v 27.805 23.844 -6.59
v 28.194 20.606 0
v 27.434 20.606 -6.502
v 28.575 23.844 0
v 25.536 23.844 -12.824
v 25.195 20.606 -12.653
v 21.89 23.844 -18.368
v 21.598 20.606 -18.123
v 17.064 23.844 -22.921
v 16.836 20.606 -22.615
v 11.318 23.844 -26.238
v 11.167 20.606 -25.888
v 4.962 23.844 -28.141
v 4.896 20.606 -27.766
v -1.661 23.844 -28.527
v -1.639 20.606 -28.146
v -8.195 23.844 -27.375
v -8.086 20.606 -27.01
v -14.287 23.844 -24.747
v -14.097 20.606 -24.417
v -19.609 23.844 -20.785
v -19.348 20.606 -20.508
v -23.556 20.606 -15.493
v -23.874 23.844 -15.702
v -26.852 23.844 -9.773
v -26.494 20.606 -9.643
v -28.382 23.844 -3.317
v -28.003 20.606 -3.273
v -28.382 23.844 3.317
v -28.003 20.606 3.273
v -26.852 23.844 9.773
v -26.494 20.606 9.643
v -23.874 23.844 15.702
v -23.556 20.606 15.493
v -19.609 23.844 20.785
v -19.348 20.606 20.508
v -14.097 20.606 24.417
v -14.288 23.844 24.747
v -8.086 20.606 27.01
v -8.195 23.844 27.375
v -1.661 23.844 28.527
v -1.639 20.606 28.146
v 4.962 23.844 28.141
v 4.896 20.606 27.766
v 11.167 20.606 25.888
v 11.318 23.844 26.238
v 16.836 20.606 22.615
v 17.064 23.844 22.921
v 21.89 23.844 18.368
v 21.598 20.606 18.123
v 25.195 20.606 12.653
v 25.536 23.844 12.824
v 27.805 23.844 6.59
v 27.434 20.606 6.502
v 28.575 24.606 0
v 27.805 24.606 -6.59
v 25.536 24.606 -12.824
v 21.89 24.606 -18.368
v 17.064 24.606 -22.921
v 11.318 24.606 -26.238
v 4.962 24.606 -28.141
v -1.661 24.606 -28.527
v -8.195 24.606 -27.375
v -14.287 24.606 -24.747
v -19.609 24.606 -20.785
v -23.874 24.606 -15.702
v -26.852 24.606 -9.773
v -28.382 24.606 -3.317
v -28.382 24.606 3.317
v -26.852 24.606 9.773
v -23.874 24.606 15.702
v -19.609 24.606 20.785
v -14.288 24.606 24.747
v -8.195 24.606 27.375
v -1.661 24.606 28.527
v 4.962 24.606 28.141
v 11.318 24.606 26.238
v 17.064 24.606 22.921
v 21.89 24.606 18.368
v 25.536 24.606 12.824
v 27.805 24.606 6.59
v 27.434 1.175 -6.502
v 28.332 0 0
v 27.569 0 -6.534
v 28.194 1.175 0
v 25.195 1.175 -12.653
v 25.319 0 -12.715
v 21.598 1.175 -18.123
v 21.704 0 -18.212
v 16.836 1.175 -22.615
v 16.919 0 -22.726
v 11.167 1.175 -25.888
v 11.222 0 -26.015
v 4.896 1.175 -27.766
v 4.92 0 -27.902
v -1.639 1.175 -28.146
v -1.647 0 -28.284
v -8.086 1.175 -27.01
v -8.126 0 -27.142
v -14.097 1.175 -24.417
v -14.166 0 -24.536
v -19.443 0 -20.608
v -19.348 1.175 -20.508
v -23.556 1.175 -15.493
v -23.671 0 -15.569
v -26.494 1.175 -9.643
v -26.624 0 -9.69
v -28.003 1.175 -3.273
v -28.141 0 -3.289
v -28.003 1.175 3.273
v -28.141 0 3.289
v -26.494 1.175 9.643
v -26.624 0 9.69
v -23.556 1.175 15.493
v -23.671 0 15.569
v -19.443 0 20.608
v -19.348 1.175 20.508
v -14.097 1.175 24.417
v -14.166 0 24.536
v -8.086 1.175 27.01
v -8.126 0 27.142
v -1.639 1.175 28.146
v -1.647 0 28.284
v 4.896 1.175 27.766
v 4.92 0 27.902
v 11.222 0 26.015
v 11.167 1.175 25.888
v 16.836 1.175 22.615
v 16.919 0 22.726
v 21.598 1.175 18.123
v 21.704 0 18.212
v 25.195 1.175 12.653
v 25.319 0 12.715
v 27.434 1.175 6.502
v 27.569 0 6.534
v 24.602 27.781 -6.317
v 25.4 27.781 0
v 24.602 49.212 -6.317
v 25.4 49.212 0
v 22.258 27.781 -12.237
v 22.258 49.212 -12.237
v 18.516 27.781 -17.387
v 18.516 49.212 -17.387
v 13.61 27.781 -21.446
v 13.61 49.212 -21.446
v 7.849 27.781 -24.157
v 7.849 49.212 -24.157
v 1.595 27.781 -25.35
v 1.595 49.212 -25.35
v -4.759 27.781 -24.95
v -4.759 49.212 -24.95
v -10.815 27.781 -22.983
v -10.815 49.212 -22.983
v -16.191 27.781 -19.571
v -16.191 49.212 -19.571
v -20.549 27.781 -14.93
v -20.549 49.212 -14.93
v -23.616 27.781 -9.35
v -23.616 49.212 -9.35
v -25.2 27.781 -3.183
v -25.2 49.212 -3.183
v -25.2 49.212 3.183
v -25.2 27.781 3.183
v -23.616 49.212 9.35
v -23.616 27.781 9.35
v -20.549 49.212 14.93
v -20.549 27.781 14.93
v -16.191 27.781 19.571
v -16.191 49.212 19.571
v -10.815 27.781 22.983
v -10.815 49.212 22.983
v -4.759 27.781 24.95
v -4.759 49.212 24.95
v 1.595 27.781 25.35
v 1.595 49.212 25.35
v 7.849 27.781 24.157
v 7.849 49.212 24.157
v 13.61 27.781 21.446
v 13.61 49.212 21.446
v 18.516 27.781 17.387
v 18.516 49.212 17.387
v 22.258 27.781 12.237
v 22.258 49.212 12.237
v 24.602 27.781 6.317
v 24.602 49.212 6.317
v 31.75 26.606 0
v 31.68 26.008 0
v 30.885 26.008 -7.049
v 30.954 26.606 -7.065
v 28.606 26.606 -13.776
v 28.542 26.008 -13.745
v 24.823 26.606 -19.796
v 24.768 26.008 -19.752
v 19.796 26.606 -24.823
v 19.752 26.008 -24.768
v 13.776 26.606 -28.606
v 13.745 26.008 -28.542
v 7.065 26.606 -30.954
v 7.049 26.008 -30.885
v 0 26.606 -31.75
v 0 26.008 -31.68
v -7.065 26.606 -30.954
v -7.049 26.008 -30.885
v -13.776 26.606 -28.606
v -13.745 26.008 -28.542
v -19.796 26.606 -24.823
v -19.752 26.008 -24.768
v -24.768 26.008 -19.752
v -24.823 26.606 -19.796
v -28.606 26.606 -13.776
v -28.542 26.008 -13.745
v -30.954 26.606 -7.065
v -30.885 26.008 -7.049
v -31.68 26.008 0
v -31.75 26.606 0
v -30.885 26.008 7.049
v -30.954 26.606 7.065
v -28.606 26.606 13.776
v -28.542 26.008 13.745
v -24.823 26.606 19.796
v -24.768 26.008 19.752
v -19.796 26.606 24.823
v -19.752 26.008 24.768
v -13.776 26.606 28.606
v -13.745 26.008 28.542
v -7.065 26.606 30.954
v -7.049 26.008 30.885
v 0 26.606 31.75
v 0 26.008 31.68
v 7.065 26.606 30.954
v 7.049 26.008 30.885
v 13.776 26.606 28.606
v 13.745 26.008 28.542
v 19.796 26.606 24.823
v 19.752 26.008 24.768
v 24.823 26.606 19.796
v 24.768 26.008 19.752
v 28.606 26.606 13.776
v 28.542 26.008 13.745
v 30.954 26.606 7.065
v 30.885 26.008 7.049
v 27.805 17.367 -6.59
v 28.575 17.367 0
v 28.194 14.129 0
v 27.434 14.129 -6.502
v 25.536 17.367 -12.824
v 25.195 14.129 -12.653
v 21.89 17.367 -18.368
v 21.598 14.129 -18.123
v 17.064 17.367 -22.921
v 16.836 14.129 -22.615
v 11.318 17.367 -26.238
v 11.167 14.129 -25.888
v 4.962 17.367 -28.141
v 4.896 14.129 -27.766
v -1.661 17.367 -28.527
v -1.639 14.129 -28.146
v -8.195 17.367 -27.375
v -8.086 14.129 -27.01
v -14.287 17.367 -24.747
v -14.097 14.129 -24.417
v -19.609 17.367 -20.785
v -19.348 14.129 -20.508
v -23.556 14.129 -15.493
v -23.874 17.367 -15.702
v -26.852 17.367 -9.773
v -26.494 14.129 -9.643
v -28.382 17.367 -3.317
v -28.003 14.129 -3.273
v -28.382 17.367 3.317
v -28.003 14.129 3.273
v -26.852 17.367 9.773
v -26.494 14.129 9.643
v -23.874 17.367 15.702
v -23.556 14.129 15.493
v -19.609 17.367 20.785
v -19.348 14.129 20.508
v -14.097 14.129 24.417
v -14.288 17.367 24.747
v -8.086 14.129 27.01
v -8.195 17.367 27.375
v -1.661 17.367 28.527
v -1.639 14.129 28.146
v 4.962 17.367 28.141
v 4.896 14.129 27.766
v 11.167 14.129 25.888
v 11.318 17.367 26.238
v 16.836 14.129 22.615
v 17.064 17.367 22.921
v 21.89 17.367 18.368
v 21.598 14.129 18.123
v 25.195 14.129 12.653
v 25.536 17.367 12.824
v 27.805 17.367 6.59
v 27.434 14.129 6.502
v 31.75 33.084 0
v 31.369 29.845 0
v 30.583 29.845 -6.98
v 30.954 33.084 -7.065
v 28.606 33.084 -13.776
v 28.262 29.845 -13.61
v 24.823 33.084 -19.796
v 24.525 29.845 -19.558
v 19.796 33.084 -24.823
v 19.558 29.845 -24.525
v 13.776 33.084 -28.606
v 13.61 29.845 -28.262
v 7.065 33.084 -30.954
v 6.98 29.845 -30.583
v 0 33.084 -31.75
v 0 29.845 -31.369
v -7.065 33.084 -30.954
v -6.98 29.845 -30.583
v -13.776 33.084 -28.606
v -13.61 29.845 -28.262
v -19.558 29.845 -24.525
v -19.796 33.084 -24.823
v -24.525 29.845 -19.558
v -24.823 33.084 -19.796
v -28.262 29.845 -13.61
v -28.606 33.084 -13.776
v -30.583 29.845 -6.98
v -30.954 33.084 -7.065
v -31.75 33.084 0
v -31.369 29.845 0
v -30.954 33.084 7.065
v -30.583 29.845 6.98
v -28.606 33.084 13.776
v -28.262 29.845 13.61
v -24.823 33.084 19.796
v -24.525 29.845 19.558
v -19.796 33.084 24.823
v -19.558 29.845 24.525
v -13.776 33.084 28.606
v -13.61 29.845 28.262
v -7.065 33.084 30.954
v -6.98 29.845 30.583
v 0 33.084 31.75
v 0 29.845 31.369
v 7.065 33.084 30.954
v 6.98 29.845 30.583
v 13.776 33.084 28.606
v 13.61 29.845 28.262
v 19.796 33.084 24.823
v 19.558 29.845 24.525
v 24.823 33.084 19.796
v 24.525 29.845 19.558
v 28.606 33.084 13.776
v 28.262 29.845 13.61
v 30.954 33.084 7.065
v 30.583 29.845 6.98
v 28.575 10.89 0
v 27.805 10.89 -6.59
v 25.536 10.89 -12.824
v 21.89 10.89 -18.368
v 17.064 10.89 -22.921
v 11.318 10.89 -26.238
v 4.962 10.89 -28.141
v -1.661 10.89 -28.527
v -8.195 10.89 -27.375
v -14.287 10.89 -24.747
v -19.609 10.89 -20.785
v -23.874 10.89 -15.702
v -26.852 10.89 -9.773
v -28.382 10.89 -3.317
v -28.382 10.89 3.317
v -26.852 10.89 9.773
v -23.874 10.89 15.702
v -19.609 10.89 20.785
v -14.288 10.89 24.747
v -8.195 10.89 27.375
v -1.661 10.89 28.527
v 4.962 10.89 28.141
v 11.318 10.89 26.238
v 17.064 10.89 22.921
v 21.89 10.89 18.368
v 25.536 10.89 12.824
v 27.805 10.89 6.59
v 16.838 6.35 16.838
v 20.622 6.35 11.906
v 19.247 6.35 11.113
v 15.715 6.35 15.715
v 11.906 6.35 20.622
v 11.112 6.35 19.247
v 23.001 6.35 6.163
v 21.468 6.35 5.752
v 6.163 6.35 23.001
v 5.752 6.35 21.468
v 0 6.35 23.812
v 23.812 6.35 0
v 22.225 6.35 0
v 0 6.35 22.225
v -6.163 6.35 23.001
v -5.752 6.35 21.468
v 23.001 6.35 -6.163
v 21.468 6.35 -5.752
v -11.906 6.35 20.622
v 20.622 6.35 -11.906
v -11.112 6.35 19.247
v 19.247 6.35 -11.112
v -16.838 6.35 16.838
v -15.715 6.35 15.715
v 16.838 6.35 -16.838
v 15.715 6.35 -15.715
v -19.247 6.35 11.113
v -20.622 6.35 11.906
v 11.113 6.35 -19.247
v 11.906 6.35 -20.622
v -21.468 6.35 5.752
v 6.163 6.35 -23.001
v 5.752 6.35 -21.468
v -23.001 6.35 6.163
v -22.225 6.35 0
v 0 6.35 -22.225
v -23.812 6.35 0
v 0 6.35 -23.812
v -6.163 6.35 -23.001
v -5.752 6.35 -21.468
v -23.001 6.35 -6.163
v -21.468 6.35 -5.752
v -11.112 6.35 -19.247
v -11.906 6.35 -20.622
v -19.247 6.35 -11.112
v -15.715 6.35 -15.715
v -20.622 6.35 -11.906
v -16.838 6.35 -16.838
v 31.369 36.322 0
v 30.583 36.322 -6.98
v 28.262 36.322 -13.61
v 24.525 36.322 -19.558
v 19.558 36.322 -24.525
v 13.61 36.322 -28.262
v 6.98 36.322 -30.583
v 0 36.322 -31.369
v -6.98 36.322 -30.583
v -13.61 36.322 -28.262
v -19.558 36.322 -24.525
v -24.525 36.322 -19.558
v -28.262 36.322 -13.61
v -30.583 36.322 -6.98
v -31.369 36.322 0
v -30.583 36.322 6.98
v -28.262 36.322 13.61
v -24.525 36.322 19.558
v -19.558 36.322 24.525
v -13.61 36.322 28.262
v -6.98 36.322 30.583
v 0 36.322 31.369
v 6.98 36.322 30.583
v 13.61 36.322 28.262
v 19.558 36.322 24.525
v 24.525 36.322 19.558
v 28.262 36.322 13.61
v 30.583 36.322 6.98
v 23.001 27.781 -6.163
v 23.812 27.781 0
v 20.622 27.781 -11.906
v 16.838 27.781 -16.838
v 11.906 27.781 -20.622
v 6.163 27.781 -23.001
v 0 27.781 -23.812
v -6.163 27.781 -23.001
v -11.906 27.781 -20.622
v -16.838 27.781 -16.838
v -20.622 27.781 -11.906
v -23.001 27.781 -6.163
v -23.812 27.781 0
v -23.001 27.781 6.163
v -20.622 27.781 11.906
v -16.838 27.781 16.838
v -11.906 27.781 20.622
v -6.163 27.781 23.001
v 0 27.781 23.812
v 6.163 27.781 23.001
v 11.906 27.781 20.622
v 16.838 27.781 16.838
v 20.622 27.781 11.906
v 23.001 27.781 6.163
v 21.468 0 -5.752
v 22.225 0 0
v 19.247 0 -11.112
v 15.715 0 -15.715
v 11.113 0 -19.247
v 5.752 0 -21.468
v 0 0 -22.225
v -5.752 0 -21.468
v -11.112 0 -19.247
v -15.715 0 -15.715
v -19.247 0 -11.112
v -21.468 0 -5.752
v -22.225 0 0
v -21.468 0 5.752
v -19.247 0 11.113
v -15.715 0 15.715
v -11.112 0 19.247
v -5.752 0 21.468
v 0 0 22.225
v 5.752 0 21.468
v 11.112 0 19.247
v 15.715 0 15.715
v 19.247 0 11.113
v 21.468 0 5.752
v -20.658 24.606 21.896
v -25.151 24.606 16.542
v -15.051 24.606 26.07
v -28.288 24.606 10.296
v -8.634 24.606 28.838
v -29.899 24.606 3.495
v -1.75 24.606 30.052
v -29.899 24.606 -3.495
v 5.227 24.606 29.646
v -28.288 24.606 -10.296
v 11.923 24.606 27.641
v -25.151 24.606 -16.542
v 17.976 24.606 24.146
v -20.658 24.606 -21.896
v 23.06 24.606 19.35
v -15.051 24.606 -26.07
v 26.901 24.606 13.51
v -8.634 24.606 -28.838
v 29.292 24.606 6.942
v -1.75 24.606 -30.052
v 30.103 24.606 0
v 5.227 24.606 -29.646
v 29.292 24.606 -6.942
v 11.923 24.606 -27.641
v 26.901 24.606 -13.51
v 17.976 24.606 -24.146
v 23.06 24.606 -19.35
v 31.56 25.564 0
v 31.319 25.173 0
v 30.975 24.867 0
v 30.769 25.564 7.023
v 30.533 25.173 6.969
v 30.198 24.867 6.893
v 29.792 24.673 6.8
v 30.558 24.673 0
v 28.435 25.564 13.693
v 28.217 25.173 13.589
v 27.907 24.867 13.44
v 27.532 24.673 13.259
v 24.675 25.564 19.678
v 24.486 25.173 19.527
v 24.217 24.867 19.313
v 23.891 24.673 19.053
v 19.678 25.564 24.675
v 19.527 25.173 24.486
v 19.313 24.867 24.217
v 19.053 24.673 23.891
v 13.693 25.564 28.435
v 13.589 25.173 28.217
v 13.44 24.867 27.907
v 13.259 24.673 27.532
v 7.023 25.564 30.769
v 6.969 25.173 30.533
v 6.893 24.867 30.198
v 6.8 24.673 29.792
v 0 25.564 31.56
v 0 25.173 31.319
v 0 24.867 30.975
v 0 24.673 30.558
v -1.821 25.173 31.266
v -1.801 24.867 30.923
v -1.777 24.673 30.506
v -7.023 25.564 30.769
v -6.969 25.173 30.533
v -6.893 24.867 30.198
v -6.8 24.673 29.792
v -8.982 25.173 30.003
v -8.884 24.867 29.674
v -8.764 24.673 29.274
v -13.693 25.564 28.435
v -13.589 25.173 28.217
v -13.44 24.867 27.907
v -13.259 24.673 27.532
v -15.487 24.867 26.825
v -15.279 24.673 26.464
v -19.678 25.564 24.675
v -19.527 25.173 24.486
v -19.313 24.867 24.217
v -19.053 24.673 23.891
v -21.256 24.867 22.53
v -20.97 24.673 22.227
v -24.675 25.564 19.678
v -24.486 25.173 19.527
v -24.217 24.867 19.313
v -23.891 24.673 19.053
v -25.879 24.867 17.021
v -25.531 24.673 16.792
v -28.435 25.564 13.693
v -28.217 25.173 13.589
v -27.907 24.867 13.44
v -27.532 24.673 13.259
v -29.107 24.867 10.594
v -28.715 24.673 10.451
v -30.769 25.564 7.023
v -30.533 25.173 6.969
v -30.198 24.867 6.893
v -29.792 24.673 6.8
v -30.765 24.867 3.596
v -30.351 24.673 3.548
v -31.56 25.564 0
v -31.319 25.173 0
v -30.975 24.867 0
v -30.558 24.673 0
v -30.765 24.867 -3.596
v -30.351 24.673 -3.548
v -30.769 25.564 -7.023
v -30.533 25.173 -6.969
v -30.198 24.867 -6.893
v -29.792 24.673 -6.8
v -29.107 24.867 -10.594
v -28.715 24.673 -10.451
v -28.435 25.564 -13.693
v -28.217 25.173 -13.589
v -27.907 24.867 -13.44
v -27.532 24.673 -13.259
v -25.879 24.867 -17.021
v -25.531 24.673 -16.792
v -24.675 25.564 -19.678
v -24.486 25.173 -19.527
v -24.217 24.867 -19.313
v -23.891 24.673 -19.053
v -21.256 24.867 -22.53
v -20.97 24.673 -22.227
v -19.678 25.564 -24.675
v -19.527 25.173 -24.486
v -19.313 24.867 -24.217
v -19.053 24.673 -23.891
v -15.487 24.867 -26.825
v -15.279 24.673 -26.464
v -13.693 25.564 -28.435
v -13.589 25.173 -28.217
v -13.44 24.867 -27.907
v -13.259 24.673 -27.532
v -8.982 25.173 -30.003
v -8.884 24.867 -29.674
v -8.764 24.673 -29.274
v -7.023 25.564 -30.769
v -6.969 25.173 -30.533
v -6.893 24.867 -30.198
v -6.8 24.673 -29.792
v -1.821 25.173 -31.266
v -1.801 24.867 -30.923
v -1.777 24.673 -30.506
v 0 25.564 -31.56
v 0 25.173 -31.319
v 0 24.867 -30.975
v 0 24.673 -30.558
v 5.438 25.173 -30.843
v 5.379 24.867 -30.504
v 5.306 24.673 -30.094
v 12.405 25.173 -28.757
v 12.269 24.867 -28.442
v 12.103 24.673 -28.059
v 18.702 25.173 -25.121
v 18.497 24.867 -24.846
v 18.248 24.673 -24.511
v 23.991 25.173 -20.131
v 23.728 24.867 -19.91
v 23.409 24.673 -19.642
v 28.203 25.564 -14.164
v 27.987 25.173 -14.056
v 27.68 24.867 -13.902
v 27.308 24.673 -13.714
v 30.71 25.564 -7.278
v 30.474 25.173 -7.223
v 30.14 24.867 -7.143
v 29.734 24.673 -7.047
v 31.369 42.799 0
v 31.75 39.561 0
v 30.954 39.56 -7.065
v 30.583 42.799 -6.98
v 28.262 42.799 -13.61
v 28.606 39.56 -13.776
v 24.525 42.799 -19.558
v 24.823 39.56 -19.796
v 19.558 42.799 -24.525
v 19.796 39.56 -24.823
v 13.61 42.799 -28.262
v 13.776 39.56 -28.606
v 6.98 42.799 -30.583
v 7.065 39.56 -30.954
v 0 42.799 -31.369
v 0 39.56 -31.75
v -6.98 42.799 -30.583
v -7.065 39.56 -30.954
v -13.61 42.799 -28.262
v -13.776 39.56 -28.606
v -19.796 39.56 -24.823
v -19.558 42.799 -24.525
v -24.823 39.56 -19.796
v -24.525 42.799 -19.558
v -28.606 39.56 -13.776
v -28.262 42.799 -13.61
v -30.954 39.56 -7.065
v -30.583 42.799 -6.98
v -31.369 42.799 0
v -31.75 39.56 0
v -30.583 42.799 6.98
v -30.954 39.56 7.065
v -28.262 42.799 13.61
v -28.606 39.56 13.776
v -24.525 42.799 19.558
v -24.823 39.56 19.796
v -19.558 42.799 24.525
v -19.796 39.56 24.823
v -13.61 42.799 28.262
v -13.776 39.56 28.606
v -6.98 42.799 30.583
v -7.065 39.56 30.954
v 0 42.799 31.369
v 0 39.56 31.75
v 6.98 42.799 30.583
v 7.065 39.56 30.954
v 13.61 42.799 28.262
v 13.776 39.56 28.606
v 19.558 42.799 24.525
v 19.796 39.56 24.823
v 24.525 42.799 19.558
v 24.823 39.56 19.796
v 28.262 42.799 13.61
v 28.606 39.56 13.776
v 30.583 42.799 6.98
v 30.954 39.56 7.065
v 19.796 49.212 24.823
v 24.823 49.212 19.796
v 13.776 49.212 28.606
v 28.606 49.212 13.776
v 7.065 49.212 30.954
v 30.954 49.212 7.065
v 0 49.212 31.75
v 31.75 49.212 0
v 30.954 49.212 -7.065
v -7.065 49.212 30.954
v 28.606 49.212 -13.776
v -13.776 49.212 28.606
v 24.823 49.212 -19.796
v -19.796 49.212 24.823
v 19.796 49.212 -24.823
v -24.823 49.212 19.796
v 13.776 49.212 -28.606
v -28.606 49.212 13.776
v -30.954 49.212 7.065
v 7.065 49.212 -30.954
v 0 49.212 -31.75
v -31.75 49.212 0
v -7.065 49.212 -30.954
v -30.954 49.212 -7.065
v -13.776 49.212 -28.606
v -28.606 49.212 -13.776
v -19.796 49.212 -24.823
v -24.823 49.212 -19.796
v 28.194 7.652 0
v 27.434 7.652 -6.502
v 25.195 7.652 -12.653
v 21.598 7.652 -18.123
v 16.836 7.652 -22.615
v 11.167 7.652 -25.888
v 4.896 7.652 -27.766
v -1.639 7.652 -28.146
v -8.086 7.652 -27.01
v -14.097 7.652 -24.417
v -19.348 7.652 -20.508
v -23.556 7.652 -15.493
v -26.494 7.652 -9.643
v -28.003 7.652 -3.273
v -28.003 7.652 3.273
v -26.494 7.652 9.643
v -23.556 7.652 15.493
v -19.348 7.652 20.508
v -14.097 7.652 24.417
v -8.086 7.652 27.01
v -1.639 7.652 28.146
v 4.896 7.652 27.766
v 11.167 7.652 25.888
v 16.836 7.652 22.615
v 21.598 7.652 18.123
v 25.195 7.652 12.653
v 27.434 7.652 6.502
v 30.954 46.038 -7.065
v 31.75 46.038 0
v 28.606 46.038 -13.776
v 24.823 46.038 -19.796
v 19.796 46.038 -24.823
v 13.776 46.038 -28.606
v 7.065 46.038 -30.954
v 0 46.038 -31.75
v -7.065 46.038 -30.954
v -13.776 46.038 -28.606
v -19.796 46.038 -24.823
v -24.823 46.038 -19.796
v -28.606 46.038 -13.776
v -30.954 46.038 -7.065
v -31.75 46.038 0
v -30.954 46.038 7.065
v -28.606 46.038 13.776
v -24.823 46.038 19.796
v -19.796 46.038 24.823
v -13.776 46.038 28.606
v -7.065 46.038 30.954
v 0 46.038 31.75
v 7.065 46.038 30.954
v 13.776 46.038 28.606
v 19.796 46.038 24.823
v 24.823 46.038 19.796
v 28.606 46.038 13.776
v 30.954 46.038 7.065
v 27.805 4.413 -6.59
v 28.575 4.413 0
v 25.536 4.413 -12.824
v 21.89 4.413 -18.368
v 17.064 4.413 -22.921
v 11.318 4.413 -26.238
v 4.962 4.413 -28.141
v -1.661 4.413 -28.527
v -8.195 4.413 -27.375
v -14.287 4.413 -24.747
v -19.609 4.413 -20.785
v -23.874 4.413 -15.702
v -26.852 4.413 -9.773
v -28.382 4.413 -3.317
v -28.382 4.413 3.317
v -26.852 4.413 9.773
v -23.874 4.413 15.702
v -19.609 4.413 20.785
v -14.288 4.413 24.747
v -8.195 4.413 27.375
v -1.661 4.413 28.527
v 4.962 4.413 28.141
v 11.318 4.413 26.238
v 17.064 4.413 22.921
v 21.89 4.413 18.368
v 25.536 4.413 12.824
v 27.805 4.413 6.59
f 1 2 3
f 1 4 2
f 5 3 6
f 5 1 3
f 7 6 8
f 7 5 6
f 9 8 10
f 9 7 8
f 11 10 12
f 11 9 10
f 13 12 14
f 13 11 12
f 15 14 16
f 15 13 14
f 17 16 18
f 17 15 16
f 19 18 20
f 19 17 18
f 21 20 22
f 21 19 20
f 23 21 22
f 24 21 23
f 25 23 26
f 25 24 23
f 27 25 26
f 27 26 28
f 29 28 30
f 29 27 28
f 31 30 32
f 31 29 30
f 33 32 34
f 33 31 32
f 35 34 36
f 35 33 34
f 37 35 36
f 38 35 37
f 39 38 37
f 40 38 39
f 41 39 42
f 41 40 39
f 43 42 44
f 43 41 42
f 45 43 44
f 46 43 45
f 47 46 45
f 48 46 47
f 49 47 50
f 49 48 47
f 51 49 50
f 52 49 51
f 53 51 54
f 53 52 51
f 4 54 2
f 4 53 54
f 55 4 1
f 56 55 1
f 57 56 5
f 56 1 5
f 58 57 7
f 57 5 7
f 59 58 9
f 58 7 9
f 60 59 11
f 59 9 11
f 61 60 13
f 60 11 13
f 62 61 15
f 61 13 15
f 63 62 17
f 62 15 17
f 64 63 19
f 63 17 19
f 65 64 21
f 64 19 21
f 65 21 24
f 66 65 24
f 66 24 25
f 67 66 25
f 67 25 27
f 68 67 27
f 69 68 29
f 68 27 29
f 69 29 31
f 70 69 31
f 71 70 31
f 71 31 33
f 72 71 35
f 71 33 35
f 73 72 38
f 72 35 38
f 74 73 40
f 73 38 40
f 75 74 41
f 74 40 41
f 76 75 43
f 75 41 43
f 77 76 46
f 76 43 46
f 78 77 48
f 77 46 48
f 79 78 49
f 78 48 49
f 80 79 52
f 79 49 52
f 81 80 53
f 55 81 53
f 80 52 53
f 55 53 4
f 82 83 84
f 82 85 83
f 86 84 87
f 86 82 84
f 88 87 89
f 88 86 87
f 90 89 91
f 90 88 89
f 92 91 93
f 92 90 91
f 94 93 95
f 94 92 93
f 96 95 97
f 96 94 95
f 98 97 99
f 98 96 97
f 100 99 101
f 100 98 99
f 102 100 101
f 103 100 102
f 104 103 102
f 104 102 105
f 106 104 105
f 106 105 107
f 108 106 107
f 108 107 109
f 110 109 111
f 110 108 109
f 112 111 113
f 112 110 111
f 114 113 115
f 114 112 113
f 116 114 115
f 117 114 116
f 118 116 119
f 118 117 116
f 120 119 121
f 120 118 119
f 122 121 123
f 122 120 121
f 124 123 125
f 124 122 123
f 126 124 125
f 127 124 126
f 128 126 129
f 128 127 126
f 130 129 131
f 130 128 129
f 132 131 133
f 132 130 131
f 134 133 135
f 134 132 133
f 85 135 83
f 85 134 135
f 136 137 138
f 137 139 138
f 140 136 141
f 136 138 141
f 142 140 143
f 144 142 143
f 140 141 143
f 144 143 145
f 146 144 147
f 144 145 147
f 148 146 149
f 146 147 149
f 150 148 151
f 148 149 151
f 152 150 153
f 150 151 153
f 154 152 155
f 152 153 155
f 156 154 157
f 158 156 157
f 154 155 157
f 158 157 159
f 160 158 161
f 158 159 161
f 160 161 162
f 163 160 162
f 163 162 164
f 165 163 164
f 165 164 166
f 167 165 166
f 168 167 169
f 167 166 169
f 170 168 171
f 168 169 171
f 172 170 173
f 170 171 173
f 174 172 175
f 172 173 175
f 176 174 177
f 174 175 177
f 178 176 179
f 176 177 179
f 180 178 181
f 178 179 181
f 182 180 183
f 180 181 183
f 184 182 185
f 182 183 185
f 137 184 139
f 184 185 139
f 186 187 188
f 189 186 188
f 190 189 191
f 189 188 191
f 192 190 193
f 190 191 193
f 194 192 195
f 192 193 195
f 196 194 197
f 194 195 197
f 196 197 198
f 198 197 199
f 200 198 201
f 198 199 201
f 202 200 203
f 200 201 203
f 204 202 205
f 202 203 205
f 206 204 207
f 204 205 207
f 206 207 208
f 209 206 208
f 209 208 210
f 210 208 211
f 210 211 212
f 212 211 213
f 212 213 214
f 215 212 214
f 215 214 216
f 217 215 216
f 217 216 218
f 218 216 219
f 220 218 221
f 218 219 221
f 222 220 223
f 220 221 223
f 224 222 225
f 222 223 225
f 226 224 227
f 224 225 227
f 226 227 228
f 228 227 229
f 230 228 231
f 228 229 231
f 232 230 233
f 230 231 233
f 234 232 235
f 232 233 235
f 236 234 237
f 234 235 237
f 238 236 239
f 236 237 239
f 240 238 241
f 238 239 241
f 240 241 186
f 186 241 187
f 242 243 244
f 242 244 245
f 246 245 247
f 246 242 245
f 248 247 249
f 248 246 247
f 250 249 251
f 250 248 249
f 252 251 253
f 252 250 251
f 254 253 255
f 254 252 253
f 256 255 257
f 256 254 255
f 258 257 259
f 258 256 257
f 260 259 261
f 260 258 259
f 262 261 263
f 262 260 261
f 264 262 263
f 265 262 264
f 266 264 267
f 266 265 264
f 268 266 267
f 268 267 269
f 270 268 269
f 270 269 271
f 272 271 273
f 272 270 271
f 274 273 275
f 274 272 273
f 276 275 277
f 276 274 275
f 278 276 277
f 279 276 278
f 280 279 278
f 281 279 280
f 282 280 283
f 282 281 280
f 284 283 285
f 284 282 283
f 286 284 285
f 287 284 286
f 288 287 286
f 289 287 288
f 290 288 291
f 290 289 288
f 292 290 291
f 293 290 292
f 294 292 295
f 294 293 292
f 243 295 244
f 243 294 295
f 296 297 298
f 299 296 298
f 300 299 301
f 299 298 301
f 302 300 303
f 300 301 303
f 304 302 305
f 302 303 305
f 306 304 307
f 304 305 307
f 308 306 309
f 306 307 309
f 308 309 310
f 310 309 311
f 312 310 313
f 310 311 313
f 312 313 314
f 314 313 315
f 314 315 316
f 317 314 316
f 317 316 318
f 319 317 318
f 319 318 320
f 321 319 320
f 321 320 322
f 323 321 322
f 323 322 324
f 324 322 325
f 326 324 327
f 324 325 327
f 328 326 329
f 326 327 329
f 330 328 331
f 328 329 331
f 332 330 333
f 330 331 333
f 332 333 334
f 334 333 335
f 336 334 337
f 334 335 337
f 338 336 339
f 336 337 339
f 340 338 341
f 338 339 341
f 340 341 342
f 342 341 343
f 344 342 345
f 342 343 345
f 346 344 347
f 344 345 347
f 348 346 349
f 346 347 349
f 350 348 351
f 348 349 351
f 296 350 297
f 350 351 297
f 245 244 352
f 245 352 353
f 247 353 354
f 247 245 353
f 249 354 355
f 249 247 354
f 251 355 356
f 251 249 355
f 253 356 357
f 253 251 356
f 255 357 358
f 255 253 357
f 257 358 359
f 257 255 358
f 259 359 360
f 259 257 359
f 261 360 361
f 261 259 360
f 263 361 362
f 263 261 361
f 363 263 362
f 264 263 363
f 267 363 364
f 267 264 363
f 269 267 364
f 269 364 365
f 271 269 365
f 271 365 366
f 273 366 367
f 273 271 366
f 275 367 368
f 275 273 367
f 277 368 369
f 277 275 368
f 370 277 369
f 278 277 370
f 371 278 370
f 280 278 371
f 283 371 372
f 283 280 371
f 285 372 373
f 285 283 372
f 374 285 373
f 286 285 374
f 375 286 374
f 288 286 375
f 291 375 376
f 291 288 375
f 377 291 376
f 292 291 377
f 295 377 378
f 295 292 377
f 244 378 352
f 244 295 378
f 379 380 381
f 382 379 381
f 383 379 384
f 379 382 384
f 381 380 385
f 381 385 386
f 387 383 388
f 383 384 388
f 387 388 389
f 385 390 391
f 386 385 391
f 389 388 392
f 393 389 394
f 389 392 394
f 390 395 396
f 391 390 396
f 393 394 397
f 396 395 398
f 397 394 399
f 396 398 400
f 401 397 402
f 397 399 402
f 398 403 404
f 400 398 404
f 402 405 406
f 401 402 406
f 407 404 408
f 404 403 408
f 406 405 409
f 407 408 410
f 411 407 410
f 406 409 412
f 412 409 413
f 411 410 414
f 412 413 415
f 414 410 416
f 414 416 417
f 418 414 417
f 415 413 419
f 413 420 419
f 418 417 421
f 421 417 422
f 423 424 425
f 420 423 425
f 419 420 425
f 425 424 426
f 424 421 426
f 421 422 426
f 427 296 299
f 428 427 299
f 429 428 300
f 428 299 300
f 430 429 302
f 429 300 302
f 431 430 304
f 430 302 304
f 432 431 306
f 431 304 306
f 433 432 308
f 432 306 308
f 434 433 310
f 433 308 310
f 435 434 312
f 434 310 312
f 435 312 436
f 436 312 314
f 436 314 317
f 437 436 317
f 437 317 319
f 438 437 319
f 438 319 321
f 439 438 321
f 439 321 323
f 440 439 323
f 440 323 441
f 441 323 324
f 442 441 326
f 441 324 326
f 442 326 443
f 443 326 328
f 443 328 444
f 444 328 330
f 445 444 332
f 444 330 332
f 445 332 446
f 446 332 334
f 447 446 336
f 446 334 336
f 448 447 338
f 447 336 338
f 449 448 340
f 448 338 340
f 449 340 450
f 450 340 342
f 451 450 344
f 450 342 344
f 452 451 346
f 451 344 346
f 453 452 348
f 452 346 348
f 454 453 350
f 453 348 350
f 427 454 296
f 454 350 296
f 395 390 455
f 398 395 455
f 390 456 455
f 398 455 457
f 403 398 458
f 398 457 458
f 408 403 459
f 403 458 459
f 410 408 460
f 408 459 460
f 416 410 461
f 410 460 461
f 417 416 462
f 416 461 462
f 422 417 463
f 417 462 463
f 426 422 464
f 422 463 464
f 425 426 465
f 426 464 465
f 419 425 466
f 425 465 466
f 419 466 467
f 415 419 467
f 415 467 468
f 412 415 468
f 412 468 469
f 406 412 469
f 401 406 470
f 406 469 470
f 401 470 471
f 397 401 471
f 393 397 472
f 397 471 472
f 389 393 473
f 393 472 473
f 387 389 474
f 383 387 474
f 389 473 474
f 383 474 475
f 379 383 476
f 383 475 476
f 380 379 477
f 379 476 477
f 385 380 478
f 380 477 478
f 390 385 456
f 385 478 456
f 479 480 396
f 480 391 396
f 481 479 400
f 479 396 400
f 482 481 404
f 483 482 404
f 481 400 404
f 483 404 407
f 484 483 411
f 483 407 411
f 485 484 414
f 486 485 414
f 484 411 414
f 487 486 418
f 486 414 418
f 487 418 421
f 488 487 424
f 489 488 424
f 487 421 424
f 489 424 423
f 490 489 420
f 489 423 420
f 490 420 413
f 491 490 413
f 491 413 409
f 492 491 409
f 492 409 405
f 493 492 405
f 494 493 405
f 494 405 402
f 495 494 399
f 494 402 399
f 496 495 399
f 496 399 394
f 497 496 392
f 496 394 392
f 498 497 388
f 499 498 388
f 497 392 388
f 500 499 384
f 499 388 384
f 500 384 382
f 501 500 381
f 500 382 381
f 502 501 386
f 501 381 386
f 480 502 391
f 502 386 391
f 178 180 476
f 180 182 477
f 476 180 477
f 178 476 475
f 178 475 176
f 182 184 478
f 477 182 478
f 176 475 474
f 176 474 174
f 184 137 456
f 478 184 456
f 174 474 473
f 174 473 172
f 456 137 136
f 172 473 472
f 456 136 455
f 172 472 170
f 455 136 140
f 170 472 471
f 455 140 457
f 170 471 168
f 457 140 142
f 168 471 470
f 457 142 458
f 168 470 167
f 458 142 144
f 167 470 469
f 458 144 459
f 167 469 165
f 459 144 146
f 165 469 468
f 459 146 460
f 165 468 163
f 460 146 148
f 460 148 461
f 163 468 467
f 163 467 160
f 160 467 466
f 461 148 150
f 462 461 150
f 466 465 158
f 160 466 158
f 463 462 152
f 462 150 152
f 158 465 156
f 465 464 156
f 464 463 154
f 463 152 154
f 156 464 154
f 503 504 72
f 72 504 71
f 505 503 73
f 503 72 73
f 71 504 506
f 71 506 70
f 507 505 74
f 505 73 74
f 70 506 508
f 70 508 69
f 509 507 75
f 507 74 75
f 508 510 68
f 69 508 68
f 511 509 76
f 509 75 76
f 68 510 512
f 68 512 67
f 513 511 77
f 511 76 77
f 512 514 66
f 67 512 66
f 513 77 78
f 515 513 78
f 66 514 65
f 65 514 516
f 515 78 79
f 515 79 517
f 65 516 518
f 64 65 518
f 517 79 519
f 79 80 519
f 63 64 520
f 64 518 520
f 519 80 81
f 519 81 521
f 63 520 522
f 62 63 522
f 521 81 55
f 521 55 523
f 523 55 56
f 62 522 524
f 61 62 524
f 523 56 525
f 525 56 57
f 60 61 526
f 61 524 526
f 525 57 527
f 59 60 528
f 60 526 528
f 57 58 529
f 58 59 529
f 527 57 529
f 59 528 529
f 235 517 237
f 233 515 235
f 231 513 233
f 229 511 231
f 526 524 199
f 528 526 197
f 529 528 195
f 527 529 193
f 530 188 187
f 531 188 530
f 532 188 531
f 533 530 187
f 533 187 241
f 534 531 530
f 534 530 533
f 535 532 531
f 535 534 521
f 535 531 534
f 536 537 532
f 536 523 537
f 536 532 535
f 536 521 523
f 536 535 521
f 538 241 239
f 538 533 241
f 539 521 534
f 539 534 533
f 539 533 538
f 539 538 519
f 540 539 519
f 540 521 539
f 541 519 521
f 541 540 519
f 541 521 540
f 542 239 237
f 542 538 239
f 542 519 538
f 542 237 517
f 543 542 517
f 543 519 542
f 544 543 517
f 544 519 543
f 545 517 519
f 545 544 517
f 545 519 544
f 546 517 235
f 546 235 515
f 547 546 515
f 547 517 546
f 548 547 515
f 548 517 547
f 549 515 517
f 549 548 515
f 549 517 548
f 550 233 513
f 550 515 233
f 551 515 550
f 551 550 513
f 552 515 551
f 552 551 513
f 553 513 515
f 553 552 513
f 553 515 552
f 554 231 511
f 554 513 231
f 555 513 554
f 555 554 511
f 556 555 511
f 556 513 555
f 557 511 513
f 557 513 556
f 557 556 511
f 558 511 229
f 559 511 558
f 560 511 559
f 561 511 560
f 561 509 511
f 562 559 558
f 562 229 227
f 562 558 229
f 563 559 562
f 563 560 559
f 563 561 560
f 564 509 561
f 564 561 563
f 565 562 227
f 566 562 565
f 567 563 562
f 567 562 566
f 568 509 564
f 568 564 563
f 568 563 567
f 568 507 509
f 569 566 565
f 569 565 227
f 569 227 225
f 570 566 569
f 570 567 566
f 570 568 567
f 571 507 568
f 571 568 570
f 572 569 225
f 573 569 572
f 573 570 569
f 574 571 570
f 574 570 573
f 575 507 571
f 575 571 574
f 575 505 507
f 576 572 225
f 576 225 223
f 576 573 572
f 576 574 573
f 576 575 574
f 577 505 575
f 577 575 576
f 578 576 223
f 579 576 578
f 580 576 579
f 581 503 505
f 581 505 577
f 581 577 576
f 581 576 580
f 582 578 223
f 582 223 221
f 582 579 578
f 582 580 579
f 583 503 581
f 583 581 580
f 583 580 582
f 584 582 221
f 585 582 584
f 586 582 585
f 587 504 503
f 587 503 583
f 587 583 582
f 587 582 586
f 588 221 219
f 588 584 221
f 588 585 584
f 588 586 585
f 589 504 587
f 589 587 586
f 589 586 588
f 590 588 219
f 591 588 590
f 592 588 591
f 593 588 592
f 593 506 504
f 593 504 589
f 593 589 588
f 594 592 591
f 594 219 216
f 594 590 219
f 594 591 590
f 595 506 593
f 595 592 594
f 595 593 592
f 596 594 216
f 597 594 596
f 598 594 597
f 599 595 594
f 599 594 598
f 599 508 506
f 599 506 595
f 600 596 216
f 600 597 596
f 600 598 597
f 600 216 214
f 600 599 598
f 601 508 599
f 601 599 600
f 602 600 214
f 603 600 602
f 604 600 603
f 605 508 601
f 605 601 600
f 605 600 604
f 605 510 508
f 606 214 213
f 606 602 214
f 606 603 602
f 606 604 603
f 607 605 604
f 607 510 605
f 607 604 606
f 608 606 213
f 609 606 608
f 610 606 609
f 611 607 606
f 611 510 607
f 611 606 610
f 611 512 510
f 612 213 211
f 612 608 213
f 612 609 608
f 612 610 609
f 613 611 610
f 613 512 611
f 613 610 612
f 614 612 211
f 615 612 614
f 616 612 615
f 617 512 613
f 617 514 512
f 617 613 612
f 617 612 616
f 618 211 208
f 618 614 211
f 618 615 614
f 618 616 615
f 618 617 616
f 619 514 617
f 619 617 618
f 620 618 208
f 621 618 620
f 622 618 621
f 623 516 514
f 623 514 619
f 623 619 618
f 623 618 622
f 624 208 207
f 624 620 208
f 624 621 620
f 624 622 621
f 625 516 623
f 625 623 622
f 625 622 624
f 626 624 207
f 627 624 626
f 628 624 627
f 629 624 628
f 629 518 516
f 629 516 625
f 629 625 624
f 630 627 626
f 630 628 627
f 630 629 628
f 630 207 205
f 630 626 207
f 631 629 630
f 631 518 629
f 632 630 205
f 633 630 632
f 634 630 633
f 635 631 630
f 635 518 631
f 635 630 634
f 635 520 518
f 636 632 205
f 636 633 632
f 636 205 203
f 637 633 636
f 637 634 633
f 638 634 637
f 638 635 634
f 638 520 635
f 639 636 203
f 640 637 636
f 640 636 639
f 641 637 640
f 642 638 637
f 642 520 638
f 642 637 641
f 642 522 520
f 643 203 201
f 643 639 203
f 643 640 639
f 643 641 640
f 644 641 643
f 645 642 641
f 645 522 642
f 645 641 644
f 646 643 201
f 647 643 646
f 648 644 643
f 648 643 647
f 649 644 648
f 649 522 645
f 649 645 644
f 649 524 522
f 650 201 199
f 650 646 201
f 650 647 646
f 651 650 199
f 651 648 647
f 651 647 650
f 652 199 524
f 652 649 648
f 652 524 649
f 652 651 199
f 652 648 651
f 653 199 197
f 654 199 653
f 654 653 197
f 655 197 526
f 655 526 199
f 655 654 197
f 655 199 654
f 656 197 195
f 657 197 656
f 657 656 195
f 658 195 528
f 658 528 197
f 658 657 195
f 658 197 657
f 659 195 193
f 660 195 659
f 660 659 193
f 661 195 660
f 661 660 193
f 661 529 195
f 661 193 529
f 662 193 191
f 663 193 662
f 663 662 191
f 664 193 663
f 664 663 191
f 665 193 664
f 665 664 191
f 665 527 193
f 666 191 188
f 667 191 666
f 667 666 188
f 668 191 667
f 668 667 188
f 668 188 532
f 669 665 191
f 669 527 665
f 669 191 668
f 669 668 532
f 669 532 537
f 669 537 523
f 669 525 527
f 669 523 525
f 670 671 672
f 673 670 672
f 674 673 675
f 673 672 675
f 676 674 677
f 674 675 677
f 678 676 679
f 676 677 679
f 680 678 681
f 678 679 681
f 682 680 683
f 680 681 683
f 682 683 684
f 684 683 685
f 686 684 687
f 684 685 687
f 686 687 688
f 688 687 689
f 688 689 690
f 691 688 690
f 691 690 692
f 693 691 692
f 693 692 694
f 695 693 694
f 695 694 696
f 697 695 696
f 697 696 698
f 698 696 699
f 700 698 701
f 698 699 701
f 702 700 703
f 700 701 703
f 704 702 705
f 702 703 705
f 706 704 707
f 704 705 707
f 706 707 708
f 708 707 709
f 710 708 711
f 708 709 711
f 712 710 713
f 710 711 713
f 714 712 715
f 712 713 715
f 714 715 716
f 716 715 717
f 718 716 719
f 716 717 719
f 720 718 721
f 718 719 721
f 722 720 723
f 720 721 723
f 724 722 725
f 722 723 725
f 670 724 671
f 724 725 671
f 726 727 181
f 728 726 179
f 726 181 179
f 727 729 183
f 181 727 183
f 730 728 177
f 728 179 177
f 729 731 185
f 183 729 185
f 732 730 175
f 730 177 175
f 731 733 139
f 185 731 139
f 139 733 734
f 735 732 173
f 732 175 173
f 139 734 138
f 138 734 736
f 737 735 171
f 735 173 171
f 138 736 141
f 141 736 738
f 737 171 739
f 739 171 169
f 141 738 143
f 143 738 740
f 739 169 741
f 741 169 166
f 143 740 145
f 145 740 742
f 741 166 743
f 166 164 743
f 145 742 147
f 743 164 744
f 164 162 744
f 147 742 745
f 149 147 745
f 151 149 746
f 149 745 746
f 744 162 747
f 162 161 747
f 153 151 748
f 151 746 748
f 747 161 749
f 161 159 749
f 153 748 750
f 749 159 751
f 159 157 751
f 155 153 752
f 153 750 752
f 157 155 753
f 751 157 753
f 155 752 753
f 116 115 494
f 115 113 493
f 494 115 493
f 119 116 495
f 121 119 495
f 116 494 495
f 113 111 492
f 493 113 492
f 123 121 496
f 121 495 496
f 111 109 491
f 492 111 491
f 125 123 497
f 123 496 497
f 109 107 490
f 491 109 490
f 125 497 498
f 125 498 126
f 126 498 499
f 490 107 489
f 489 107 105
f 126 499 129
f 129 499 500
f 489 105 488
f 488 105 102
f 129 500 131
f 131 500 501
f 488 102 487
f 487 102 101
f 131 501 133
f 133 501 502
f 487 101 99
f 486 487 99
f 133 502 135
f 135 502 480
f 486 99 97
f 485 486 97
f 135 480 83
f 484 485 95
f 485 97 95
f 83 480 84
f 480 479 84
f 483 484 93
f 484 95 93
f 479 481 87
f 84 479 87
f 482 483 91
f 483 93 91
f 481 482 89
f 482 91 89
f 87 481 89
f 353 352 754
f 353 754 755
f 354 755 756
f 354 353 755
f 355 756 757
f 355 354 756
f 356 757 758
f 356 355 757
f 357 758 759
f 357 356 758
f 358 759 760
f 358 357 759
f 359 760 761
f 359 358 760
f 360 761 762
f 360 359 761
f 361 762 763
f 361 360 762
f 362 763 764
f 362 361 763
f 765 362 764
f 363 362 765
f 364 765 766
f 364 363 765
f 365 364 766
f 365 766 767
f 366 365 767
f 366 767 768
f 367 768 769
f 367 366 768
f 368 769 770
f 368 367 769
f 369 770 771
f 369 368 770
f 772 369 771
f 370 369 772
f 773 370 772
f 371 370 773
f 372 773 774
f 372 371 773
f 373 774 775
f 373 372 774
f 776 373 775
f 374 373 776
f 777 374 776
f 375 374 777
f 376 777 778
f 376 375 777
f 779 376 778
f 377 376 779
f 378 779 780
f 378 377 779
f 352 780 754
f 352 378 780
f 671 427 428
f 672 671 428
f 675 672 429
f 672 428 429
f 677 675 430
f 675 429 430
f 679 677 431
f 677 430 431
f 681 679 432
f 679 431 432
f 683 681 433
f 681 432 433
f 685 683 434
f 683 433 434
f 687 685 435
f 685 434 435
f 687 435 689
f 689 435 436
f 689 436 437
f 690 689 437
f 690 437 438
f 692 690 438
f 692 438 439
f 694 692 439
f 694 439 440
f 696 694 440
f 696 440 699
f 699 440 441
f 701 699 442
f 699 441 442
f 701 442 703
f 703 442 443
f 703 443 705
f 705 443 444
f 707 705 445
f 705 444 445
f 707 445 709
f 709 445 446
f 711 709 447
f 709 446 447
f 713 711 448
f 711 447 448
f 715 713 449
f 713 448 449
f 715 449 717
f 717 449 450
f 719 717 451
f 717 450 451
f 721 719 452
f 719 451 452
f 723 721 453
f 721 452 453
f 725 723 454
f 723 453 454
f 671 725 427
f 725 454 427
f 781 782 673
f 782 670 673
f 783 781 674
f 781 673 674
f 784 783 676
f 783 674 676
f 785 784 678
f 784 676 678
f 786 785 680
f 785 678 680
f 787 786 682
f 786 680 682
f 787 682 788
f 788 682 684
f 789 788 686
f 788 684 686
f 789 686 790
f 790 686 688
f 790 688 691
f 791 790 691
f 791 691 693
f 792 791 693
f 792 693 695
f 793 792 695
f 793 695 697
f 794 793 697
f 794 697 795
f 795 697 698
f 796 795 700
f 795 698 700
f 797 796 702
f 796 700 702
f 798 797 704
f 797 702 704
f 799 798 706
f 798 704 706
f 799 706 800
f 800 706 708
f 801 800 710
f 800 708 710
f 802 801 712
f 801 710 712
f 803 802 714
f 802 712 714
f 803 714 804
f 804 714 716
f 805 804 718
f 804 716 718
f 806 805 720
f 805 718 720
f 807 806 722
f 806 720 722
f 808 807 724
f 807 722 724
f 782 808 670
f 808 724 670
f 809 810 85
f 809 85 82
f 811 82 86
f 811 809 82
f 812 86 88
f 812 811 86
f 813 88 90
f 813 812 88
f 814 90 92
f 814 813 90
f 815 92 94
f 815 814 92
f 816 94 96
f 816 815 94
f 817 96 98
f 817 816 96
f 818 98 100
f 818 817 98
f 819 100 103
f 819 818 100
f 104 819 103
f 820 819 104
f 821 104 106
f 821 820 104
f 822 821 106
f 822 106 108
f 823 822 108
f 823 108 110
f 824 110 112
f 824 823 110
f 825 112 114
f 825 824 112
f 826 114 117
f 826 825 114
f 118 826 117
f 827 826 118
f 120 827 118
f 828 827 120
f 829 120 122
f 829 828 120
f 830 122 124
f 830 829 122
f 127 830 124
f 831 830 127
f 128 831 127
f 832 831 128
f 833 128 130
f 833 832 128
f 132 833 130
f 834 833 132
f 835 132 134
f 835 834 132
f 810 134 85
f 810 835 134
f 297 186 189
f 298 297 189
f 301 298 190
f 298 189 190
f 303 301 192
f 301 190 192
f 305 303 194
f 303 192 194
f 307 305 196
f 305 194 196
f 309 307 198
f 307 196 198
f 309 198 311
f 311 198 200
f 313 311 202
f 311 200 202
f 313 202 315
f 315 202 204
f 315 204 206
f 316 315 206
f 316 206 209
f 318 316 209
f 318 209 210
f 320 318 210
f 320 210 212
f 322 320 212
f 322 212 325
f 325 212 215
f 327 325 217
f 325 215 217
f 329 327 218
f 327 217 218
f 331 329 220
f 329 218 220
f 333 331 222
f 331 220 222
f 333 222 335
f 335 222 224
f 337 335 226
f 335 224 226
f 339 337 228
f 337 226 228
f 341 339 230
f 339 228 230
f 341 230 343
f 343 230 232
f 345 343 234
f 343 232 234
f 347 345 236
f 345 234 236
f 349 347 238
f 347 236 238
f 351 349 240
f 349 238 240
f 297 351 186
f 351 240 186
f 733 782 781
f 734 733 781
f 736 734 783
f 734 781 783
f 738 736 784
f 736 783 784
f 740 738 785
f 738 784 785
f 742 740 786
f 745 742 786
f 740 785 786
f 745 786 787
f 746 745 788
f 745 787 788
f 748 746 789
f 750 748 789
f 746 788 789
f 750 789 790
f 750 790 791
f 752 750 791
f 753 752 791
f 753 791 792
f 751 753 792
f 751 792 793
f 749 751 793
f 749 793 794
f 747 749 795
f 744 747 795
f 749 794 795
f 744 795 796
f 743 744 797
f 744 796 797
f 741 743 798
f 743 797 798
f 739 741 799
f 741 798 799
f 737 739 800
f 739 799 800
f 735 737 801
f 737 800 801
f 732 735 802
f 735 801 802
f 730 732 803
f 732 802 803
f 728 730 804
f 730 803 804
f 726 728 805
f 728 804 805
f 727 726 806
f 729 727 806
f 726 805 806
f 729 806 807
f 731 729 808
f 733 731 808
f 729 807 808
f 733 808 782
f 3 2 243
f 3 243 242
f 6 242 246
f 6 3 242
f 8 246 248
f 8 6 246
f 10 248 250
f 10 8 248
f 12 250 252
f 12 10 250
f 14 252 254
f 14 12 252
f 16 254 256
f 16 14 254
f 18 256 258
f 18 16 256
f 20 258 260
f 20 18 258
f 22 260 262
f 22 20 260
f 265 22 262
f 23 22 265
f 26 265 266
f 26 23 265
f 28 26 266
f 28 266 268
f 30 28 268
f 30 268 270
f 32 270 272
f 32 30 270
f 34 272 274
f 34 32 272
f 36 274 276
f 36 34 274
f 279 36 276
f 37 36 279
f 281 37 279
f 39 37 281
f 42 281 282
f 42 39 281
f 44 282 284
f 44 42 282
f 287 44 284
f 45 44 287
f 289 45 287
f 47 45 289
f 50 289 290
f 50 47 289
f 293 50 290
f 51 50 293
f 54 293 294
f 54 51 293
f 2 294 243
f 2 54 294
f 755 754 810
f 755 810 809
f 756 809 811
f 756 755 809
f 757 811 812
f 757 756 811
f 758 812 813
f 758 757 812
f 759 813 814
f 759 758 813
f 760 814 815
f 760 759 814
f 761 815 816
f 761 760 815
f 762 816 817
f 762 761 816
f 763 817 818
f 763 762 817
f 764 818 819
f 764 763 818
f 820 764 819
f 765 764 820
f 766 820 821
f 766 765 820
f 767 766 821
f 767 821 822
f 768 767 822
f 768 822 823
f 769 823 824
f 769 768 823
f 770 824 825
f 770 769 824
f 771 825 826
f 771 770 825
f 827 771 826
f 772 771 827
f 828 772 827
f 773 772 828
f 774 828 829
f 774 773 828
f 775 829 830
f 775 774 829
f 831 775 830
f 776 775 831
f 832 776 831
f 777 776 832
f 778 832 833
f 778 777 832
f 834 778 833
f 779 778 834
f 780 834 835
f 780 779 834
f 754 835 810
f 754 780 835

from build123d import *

# Parameters (mm, degrees)
LPATTERN1_COUNT = 6
LPATTERN1_PITCH = 6.477
FILLET1_R       = 1.5875


with BuildPart() as part:
    # Sketch2 → Revolve1 (revolve)
    with BuildSketch(Plane.XY):
        Polygon((25.4, 49.2125), (31.75, 49.2125), (31.75, 24.60625), (28.575, 24.60625), (28.575, 0), (22.225, 0), (22.225, 6.35), (23.8125, 6.35), (23.8125, 27.78125), (25.4, 27.78125), align=None)
    revolve(axis=Axis((0, -40.656569806, 0), (0, 1, 0)))

    # Sketch3 → Cut-Revolve1 (revolve, cut)
    with BuildSketch(Plane.XY):
        Polygon((31.75, 46.0375), (31.369, 42.799), (31.75, 39.5605), align=None)
        Polygon((28.575, 23.84425), (28.575, 17.36725), (28.194, 20.60575), align=None)
    cut_revolve1 = revolve(axis=Axis((0, -40.656569806, 0), (0, 1, 0)), mode=Mode.SUBTRACT)

    # LPattern1: Cut-Revolve1 ×6
    with Locations(*[(0, -i * LPATTERN1_PITCH, 0) for i in range(1, LPATTERN1_COUNT)]):
        add(cut_revolve1, mode=Mode.SUBTRACT)

    # Fillet1
    fillet1_edges = [part.edges().sort_by_distance(p)[0] for p in [
        (-31.514676471, 24.60625, 0),
    ]]
    fillet(fillet1_edges, radius=FILLET1_R)


solid = part.part
